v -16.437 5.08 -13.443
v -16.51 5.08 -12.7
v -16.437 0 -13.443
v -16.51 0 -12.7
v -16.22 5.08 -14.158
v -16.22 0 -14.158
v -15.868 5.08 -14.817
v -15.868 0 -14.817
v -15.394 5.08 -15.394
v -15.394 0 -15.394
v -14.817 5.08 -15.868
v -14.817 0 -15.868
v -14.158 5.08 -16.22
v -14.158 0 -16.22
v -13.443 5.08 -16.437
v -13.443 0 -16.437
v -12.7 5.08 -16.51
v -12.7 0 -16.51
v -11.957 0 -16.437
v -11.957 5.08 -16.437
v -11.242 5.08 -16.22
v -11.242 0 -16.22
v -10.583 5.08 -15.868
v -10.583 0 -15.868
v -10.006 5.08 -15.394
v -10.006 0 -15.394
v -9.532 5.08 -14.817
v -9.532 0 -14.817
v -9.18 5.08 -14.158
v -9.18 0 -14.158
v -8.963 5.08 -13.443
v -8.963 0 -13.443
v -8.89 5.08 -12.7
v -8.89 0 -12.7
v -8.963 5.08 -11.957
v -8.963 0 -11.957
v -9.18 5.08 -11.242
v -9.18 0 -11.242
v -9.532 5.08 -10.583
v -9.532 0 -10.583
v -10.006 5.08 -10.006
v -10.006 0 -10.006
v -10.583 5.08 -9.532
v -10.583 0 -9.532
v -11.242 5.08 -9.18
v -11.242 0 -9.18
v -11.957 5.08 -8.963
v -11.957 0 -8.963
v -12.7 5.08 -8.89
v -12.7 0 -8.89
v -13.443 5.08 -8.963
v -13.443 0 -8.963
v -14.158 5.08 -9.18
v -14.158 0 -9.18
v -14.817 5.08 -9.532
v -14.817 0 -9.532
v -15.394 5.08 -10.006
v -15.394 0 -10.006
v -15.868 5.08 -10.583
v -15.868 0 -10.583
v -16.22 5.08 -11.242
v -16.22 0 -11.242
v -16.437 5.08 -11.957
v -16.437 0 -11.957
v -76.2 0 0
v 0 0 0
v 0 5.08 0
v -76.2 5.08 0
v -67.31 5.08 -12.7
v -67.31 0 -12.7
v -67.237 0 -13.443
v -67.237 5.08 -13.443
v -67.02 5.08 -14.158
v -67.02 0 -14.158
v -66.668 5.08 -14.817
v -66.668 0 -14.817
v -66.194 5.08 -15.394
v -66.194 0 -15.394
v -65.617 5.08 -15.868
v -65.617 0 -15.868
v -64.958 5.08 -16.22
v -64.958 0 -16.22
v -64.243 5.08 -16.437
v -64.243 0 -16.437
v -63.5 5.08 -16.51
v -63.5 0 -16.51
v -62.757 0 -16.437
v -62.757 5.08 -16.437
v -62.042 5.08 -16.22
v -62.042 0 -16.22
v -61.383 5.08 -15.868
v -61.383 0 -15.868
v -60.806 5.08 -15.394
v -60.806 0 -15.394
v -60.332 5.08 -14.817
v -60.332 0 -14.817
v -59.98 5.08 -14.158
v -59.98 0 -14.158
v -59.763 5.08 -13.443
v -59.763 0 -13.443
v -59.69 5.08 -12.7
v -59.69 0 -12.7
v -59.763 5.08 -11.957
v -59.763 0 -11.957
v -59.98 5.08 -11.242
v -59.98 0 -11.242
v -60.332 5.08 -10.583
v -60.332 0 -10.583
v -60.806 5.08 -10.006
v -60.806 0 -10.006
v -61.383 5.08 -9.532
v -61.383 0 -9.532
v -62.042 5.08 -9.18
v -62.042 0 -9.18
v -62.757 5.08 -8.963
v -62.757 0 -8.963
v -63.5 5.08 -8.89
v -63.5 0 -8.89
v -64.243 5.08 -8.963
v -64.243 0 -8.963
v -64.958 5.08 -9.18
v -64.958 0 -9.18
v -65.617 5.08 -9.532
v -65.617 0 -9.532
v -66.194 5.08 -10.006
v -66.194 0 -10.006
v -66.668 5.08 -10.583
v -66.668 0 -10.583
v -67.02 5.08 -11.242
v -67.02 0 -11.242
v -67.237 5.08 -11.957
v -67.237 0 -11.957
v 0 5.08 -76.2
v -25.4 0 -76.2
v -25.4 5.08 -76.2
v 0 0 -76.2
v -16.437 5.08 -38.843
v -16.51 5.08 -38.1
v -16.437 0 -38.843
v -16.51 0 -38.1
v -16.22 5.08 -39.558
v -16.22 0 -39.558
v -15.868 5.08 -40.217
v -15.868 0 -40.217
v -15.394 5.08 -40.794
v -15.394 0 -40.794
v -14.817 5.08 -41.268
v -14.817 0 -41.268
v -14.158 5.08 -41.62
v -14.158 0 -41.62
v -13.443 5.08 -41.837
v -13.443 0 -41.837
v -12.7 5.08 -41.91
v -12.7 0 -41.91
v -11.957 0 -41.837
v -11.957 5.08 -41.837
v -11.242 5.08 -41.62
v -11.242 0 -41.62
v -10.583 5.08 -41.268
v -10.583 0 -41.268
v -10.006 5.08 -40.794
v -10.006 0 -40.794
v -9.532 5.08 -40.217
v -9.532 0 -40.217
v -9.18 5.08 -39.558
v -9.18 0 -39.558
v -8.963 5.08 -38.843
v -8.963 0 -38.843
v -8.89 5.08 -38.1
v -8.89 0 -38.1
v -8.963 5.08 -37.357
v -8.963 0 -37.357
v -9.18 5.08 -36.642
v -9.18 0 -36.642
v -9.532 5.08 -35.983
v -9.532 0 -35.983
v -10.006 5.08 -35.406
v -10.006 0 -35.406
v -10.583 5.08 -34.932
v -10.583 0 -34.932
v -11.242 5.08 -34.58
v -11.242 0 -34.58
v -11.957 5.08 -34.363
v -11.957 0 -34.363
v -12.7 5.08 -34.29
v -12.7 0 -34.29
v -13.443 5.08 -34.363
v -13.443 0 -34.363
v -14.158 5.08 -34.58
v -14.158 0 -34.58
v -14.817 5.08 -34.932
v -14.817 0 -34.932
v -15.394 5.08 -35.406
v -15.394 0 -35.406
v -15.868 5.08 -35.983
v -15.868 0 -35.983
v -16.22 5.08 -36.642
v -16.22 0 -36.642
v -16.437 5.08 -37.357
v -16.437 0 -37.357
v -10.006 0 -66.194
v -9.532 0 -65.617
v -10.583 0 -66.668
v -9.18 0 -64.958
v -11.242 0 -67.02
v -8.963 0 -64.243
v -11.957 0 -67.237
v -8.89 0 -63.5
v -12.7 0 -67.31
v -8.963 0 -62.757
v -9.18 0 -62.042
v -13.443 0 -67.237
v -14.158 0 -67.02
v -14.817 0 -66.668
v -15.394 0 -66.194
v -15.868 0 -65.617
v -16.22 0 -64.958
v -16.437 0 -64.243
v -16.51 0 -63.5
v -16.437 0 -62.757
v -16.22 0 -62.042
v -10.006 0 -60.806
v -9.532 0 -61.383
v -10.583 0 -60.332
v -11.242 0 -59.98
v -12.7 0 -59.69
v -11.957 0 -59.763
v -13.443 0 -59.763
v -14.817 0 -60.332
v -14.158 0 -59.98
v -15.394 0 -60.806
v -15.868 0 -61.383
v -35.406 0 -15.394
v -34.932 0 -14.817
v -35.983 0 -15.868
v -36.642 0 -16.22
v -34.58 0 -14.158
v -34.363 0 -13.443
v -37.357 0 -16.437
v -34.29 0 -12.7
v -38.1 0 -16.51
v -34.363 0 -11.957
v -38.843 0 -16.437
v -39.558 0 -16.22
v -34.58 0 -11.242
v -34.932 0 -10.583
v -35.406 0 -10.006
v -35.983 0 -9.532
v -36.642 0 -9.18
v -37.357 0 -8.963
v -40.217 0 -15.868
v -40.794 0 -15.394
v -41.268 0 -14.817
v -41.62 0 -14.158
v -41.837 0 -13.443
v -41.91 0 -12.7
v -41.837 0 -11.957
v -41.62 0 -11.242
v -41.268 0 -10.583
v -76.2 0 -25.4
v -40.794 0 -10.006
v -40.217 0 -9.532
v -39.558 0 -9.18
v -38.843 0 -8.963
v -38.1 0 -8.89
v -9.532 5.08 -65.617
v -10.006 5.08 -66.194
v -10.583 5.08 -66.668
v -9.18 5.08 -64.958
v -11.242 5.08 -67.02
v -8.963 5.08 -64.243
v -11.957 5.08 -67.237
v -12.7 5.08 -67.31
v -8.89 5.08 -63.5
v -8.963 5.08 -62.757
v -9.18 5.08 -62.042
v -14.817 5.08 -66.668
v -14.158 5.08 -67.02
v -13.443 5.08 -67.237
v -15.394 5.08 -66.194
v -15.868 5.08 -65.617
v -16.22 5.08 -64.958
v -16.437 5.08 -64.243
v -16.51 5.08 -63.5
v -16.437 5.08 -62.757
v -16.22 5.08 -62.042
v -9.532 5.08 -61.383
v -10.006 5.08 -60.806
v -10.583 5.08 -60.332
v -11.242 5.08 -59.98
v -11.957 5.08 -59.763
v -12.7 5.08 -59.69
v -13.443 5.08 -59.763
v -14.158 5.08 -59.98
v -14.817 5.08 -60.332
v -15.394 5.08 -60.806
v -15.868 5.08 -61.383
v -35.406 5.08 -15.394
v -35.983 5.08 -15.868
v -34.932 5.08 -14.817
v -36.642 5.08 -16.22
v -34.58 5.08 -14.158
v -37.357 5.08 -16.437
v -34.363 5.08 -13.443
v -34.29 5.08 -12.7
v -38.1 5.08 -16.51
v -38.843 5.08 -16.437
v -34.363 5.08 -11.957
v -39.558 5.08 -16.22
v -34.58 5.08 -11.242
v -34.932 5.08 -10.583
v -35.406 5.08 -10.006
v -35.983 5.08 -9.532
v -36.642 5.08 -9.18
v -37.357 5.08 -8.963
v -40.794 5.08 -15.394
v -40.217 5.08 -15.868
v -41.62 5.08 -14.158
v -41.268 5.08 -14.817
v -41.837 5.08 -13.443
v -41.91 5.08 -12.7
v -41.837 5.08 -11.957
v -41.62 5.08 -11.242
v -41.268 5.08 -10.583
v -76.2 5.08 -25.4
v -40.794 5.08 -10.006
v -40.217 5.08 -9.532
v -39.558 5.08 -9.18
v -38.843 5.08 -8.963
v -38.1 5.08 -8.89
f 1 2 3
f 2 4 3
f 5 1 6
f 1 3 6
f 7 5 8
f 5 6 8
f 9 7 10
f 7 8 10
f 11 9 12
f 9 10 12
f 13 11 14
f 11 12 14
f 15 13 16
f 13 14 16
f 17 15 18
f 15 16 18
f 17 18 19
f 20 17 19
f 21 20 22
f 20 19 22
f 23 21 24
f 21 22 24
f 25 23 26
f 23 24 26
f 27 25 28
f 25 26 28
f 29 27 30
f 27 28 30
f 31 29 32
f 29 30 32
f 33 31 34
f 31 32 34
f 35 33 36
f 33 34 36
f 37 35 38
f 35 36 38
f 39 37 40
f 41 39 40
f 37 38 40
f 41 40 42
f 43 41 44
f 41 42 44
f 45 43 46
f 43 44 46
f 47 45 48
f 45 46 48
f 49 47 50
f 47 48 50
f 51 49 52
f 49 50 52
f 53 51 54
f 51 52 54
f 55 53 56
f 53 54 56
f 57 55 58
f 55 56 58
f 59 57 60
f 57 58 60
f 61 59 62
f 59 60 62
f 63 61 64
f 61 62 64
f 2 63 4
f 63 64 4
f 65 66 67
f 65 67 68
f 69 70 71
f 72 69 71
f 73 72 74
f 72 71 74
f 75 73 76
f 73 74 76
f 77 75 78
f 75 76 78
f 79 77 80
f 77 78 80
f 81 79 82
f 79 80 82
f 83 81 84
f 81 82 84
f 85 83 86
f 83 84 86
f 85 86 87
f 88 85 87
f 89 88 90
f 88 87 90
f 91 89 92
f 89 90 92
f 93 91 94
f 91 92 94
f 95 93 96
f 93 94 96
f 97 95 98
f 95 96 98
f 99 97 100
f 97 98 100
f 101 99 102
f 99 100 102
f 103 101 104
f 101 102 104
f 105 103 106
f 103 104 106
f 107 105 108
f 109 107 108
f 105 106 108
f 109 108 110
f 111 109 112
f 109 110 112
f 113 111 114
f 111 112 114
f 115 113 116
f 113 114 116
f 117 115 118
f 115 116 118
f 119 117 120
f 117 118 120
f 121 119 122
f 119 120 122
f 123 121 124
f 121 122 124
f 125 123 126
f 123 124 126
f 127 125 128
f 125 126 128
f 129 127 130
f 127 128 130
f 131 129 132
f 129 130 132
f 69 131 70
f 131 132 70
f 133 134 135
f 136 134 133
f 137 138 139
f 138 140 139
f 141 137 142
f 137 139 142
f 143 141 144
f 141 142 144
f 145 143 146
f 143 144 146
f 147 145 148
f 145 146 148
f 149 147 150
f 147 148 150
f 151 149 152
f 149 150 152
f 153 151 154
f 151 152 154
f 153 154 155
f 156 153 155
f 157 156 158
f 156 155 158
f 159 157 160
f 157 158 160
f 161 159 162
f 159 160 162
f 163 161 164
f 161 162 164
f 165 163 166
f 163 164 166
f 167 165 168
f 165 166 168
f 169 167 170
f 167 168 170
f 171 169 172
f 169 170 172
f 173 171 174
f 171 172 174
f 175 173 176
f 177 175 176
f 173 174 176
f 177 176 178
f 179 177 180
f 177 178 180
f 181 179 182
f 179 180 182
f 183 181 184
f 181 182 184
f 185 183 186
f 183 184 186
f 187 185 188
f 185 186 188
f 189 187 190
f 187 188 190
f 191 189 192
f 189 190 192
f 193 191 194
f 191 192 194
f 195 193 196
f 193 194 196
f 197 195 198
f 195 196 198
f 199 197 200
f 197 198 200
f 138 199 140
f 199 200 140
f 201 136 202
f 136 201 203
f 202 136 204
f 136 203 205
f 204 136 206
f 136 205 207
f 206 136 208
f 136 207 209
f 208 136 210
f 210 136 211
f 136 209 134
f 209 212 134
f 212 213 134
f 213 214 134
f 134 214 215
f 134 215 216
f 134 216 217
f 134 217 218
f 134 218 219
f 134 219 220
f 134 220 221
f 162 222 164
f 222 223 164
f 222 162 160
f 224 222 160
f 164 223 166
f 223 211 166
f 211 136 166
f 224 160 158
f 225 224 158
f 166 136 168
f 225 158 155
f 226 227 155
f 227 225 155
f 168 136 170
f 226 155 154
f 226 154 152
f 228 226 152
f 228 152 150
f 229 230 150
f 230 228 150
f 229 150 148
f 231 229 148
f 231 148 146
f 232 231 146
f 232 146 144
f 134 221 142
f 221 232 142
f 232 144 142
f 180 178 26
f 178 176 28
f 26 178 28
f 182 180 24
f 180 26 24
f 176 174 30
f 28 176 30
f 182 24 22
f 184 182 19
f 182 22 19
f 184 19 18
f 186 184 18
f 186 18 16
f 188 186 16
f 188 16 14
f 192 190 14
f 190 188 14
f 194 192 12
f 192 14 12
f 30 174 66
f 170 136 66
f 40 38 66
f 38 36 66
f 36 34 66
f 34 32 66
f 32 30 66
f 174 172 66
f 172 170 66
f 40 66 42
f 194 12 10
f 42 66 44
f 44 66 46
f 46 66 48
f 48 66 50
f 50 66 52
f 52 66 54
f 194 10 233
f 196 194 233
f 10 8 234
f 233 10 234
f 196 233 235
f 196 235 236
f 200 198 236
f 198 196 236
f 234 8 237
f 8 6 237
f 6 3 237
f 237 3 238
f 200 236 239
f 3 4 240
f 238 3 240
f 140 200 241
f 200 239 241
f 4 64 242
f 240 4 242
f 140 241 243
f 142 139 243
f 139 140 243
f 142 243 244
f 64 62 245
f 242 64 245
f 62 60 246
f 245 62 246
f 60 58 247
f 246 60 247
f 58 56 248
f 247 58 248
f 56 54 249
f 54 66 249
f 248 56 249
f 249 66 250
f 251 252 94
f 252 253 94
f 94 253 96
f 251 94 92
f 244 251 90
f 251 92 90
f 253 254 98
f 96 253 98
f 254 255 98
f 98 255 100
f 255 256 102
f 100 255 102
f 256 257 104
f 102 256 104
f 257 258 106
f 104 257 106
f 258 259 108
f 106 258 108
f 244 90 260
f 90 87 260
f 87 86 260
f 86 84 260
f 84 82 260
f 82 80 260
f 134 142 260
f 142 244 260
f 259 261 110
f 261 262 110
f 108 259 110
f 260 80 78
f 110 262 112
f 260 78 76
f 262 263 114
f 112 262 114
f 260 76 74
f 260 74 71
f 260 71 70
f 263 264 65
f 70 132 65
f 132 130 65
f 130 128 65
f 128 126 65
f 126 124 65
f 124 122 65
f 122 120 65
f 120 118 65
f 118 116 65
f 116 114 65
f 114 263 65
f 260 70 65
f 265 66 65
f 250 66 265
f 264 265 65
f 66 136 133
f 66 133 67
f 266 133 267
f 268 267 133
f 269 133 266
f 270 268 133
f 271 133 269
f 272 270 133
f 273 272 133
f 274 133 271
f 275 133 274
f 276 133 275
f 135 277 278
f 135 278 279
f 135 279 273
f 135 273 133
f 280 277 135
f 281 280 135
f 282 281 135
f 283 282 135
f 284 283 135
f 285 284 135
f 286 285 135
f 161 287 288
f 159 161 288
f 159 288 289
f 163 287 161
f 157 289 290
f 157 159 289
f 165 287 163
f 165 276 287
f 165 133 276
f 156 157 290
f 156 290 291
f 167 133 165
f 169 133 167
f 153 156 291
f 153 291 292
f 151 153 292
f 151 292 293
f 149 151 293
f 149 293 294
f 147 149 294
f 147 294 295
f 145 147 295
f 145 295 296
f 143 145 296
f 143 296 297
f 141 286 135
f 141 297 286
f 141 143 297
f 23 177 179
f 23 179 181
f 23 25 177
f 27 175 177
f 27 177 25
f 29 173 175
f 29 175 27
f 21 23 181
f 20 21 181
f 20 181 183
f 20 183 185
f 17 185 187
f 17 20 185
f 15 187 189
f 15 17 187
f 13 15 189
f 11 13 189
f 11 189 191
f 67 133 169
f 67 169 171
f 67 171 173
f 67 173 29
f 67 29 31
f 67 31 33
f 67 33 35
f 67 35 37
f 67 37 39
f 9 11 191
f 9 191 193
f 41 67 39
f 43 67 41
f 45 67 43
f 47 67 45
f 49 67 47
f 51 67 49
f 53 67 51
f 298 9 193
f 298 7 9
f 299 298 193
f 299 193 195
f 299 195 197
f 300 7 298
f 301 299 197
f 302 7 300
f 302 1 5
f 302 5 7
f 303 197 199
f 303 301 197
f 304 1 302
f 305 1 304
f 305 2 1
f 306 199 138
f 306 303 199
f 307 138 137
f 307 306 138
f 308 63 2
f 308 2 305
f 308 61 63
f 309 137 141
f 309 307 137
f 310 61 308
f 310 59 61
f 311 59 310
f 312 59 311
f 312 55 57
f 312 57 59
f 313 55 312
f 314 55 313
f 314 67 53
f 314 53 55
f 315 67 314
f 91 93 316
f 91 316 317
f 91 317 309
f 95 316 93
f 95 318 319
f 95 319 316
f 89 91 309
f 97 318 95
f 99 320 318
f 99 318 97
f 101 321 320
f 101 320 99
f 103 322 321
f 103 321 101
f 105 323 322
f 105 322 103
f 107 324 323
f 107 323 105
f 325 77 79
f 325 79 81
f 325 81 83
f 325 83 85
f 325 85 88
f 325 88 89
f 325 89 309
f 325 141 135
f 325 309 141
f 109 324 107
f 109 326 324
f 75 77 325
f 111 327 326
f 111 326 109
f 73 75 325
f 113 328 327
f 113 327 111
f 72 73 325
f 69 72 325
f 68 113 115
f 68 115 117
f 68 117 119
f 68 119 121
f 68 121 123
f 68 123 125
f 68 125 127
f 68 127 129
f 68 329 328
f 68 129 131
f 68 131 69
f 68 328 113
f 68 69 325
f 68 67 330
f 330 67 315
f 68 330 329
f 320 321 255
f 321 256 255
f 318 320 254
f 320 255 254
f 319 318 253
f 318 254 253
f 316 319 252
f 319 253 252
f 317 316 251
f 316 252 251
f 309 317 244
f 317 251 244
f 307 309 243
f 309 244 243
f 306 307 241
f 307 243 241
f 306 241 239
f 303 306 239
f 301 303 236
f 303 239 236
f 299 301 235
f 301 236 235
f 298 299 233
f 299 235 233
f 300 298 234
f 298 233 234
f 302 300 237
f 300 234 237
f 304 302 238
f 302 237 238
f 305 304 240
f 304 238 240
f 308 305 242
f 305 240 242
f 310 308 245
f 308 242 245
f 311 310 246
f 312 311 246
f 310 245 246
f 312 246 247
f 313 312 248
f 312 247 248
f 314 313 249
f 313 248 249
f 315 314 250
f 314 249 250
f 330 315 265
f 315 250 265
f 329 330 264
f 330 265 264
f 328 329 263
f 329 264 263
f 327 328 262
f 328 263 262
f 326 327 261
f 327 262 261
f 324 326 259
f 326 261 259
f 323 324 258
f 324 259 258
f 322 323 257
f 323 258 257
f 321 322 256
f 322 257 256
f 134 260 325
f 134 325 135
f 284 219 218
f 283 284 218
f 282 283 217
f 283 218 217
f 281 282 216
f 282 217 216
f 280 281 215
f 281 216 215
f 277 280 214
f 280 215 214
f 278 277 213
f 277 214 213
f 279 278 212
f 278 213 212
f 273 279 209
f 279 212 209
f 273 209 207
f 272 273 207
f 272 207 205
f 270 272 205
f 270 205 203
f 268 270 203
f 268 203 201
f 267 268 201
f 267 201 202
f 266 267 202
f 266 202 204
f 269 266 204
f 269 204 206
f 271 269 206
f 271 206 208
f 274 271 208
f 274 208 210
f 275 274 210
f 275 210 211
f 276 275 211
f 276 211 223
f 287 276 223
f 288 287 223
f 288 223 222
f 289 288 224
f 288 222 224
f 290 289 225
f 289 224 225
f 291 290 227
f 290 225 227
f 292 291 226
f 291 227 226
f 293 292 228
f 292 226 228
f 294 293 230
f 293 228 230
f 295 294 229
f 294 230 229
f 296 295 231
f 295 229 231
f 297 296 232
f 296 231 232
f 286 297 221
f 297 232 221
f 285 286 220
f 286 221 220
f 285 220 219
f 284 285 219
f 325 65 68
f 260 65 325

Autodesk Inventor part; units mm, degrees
ref_plane "YZ Plane" through (0, 0, 0) normal (1, 0, 0) x (0, 1, 0)
ref_plane "XZ Plane" through (0, 0, 0) normal (0, 1, 0) x (-1, 0, 0)
ref_plane "XY Plane" through (0, 0, 0) normal (0, 0, 1) x (1, 0, 0)
sketch "Sketch1" plane through (0, 0, 0) normal (0, 1, 0) x (-1, 0, 0)
  line L0 (0, 0) -> (25.4, 0)
  line L1 (25.4, 0) -> (25.4, -76.2)
  line L2 (25.4, -76.2) -> (0, -76.2)
  line L3 (0, -76.2) -> (0, 0)
  line L4 (0, 0) -> (76.2, 0)
  line L5 (76.2, 0) -> (76.2, -25.4)
  line L6 (76.2, -25.4) -> (0, -25.4)
  line L7 (0, -25.4) -> (0, 0)
  line L8 (76.2, -12.7) -> (0, -12.7)
  line L9 (12.7, -76.2) -> (12.7, 0)
  line L10 (12.7, -12.7) -> (38.1, -12.7)
  line L11 (38.1, -12.7) -> (63.5, -12.7)
  line L12 (12.7, -12.7) -> (12.7, -38.1)
  line L13 (12.7, -38.1) -> (12.7, -63.5)
  circle A0 centre (12.7, -12.7) radius 3.81
  circle A1 centre (38.1, -12.7) radius 3.81
  circle A2 centre (63.5, -12.7) radius 3.81
  circle A3 centre (12.7, -38.1) radius 3.81
  circle A4 centre (12.7, -63.5) radius 3.81
  line L14 (76.2, -25.4) -> (25.4, -76.2)
  point P0 (25.4, -25.4)
  dimension "d0" = 25.4
  dimension "d1" = 76.2
  dimension "d2" = 76.2
  dimension "d3" = 25.4
  dimension "d4" = 25.4
  dimension "d5" = 25.4
  dimension "d6" = 25.4
  dimension "d7" = 25.4
  dimension "d8" = 7.62
  dimension "d9" = 7.62
  dimension "d10" = 7.62
  dimension "d11" = 7.62
  dimension "d12" = 7.62
extrude "Extrusion1" add sketch "Sketch1" along normal blind 5.08 contours L0 L9 A0 L8 L3 | L0 L1 L8 A0 L9 | L8 A0 L9 L6 L3 | L4 L5 L8 A2 A1 L1 | L6 L9 A3 A4 L2 L3 | L8 A1 A2 L5 L6 L1 | L1 L6 L9 A0 L8 | L6 L1 L2 L9 A4 A3 | L6 L14 L1
equation "\"d9\" = d8"
equation "\"d10\" = d8"
equation "\"d11\" = d8"
equation "\"d12\" = d8"
properties part number "corner_bracket" material "Aluminum 6061"
